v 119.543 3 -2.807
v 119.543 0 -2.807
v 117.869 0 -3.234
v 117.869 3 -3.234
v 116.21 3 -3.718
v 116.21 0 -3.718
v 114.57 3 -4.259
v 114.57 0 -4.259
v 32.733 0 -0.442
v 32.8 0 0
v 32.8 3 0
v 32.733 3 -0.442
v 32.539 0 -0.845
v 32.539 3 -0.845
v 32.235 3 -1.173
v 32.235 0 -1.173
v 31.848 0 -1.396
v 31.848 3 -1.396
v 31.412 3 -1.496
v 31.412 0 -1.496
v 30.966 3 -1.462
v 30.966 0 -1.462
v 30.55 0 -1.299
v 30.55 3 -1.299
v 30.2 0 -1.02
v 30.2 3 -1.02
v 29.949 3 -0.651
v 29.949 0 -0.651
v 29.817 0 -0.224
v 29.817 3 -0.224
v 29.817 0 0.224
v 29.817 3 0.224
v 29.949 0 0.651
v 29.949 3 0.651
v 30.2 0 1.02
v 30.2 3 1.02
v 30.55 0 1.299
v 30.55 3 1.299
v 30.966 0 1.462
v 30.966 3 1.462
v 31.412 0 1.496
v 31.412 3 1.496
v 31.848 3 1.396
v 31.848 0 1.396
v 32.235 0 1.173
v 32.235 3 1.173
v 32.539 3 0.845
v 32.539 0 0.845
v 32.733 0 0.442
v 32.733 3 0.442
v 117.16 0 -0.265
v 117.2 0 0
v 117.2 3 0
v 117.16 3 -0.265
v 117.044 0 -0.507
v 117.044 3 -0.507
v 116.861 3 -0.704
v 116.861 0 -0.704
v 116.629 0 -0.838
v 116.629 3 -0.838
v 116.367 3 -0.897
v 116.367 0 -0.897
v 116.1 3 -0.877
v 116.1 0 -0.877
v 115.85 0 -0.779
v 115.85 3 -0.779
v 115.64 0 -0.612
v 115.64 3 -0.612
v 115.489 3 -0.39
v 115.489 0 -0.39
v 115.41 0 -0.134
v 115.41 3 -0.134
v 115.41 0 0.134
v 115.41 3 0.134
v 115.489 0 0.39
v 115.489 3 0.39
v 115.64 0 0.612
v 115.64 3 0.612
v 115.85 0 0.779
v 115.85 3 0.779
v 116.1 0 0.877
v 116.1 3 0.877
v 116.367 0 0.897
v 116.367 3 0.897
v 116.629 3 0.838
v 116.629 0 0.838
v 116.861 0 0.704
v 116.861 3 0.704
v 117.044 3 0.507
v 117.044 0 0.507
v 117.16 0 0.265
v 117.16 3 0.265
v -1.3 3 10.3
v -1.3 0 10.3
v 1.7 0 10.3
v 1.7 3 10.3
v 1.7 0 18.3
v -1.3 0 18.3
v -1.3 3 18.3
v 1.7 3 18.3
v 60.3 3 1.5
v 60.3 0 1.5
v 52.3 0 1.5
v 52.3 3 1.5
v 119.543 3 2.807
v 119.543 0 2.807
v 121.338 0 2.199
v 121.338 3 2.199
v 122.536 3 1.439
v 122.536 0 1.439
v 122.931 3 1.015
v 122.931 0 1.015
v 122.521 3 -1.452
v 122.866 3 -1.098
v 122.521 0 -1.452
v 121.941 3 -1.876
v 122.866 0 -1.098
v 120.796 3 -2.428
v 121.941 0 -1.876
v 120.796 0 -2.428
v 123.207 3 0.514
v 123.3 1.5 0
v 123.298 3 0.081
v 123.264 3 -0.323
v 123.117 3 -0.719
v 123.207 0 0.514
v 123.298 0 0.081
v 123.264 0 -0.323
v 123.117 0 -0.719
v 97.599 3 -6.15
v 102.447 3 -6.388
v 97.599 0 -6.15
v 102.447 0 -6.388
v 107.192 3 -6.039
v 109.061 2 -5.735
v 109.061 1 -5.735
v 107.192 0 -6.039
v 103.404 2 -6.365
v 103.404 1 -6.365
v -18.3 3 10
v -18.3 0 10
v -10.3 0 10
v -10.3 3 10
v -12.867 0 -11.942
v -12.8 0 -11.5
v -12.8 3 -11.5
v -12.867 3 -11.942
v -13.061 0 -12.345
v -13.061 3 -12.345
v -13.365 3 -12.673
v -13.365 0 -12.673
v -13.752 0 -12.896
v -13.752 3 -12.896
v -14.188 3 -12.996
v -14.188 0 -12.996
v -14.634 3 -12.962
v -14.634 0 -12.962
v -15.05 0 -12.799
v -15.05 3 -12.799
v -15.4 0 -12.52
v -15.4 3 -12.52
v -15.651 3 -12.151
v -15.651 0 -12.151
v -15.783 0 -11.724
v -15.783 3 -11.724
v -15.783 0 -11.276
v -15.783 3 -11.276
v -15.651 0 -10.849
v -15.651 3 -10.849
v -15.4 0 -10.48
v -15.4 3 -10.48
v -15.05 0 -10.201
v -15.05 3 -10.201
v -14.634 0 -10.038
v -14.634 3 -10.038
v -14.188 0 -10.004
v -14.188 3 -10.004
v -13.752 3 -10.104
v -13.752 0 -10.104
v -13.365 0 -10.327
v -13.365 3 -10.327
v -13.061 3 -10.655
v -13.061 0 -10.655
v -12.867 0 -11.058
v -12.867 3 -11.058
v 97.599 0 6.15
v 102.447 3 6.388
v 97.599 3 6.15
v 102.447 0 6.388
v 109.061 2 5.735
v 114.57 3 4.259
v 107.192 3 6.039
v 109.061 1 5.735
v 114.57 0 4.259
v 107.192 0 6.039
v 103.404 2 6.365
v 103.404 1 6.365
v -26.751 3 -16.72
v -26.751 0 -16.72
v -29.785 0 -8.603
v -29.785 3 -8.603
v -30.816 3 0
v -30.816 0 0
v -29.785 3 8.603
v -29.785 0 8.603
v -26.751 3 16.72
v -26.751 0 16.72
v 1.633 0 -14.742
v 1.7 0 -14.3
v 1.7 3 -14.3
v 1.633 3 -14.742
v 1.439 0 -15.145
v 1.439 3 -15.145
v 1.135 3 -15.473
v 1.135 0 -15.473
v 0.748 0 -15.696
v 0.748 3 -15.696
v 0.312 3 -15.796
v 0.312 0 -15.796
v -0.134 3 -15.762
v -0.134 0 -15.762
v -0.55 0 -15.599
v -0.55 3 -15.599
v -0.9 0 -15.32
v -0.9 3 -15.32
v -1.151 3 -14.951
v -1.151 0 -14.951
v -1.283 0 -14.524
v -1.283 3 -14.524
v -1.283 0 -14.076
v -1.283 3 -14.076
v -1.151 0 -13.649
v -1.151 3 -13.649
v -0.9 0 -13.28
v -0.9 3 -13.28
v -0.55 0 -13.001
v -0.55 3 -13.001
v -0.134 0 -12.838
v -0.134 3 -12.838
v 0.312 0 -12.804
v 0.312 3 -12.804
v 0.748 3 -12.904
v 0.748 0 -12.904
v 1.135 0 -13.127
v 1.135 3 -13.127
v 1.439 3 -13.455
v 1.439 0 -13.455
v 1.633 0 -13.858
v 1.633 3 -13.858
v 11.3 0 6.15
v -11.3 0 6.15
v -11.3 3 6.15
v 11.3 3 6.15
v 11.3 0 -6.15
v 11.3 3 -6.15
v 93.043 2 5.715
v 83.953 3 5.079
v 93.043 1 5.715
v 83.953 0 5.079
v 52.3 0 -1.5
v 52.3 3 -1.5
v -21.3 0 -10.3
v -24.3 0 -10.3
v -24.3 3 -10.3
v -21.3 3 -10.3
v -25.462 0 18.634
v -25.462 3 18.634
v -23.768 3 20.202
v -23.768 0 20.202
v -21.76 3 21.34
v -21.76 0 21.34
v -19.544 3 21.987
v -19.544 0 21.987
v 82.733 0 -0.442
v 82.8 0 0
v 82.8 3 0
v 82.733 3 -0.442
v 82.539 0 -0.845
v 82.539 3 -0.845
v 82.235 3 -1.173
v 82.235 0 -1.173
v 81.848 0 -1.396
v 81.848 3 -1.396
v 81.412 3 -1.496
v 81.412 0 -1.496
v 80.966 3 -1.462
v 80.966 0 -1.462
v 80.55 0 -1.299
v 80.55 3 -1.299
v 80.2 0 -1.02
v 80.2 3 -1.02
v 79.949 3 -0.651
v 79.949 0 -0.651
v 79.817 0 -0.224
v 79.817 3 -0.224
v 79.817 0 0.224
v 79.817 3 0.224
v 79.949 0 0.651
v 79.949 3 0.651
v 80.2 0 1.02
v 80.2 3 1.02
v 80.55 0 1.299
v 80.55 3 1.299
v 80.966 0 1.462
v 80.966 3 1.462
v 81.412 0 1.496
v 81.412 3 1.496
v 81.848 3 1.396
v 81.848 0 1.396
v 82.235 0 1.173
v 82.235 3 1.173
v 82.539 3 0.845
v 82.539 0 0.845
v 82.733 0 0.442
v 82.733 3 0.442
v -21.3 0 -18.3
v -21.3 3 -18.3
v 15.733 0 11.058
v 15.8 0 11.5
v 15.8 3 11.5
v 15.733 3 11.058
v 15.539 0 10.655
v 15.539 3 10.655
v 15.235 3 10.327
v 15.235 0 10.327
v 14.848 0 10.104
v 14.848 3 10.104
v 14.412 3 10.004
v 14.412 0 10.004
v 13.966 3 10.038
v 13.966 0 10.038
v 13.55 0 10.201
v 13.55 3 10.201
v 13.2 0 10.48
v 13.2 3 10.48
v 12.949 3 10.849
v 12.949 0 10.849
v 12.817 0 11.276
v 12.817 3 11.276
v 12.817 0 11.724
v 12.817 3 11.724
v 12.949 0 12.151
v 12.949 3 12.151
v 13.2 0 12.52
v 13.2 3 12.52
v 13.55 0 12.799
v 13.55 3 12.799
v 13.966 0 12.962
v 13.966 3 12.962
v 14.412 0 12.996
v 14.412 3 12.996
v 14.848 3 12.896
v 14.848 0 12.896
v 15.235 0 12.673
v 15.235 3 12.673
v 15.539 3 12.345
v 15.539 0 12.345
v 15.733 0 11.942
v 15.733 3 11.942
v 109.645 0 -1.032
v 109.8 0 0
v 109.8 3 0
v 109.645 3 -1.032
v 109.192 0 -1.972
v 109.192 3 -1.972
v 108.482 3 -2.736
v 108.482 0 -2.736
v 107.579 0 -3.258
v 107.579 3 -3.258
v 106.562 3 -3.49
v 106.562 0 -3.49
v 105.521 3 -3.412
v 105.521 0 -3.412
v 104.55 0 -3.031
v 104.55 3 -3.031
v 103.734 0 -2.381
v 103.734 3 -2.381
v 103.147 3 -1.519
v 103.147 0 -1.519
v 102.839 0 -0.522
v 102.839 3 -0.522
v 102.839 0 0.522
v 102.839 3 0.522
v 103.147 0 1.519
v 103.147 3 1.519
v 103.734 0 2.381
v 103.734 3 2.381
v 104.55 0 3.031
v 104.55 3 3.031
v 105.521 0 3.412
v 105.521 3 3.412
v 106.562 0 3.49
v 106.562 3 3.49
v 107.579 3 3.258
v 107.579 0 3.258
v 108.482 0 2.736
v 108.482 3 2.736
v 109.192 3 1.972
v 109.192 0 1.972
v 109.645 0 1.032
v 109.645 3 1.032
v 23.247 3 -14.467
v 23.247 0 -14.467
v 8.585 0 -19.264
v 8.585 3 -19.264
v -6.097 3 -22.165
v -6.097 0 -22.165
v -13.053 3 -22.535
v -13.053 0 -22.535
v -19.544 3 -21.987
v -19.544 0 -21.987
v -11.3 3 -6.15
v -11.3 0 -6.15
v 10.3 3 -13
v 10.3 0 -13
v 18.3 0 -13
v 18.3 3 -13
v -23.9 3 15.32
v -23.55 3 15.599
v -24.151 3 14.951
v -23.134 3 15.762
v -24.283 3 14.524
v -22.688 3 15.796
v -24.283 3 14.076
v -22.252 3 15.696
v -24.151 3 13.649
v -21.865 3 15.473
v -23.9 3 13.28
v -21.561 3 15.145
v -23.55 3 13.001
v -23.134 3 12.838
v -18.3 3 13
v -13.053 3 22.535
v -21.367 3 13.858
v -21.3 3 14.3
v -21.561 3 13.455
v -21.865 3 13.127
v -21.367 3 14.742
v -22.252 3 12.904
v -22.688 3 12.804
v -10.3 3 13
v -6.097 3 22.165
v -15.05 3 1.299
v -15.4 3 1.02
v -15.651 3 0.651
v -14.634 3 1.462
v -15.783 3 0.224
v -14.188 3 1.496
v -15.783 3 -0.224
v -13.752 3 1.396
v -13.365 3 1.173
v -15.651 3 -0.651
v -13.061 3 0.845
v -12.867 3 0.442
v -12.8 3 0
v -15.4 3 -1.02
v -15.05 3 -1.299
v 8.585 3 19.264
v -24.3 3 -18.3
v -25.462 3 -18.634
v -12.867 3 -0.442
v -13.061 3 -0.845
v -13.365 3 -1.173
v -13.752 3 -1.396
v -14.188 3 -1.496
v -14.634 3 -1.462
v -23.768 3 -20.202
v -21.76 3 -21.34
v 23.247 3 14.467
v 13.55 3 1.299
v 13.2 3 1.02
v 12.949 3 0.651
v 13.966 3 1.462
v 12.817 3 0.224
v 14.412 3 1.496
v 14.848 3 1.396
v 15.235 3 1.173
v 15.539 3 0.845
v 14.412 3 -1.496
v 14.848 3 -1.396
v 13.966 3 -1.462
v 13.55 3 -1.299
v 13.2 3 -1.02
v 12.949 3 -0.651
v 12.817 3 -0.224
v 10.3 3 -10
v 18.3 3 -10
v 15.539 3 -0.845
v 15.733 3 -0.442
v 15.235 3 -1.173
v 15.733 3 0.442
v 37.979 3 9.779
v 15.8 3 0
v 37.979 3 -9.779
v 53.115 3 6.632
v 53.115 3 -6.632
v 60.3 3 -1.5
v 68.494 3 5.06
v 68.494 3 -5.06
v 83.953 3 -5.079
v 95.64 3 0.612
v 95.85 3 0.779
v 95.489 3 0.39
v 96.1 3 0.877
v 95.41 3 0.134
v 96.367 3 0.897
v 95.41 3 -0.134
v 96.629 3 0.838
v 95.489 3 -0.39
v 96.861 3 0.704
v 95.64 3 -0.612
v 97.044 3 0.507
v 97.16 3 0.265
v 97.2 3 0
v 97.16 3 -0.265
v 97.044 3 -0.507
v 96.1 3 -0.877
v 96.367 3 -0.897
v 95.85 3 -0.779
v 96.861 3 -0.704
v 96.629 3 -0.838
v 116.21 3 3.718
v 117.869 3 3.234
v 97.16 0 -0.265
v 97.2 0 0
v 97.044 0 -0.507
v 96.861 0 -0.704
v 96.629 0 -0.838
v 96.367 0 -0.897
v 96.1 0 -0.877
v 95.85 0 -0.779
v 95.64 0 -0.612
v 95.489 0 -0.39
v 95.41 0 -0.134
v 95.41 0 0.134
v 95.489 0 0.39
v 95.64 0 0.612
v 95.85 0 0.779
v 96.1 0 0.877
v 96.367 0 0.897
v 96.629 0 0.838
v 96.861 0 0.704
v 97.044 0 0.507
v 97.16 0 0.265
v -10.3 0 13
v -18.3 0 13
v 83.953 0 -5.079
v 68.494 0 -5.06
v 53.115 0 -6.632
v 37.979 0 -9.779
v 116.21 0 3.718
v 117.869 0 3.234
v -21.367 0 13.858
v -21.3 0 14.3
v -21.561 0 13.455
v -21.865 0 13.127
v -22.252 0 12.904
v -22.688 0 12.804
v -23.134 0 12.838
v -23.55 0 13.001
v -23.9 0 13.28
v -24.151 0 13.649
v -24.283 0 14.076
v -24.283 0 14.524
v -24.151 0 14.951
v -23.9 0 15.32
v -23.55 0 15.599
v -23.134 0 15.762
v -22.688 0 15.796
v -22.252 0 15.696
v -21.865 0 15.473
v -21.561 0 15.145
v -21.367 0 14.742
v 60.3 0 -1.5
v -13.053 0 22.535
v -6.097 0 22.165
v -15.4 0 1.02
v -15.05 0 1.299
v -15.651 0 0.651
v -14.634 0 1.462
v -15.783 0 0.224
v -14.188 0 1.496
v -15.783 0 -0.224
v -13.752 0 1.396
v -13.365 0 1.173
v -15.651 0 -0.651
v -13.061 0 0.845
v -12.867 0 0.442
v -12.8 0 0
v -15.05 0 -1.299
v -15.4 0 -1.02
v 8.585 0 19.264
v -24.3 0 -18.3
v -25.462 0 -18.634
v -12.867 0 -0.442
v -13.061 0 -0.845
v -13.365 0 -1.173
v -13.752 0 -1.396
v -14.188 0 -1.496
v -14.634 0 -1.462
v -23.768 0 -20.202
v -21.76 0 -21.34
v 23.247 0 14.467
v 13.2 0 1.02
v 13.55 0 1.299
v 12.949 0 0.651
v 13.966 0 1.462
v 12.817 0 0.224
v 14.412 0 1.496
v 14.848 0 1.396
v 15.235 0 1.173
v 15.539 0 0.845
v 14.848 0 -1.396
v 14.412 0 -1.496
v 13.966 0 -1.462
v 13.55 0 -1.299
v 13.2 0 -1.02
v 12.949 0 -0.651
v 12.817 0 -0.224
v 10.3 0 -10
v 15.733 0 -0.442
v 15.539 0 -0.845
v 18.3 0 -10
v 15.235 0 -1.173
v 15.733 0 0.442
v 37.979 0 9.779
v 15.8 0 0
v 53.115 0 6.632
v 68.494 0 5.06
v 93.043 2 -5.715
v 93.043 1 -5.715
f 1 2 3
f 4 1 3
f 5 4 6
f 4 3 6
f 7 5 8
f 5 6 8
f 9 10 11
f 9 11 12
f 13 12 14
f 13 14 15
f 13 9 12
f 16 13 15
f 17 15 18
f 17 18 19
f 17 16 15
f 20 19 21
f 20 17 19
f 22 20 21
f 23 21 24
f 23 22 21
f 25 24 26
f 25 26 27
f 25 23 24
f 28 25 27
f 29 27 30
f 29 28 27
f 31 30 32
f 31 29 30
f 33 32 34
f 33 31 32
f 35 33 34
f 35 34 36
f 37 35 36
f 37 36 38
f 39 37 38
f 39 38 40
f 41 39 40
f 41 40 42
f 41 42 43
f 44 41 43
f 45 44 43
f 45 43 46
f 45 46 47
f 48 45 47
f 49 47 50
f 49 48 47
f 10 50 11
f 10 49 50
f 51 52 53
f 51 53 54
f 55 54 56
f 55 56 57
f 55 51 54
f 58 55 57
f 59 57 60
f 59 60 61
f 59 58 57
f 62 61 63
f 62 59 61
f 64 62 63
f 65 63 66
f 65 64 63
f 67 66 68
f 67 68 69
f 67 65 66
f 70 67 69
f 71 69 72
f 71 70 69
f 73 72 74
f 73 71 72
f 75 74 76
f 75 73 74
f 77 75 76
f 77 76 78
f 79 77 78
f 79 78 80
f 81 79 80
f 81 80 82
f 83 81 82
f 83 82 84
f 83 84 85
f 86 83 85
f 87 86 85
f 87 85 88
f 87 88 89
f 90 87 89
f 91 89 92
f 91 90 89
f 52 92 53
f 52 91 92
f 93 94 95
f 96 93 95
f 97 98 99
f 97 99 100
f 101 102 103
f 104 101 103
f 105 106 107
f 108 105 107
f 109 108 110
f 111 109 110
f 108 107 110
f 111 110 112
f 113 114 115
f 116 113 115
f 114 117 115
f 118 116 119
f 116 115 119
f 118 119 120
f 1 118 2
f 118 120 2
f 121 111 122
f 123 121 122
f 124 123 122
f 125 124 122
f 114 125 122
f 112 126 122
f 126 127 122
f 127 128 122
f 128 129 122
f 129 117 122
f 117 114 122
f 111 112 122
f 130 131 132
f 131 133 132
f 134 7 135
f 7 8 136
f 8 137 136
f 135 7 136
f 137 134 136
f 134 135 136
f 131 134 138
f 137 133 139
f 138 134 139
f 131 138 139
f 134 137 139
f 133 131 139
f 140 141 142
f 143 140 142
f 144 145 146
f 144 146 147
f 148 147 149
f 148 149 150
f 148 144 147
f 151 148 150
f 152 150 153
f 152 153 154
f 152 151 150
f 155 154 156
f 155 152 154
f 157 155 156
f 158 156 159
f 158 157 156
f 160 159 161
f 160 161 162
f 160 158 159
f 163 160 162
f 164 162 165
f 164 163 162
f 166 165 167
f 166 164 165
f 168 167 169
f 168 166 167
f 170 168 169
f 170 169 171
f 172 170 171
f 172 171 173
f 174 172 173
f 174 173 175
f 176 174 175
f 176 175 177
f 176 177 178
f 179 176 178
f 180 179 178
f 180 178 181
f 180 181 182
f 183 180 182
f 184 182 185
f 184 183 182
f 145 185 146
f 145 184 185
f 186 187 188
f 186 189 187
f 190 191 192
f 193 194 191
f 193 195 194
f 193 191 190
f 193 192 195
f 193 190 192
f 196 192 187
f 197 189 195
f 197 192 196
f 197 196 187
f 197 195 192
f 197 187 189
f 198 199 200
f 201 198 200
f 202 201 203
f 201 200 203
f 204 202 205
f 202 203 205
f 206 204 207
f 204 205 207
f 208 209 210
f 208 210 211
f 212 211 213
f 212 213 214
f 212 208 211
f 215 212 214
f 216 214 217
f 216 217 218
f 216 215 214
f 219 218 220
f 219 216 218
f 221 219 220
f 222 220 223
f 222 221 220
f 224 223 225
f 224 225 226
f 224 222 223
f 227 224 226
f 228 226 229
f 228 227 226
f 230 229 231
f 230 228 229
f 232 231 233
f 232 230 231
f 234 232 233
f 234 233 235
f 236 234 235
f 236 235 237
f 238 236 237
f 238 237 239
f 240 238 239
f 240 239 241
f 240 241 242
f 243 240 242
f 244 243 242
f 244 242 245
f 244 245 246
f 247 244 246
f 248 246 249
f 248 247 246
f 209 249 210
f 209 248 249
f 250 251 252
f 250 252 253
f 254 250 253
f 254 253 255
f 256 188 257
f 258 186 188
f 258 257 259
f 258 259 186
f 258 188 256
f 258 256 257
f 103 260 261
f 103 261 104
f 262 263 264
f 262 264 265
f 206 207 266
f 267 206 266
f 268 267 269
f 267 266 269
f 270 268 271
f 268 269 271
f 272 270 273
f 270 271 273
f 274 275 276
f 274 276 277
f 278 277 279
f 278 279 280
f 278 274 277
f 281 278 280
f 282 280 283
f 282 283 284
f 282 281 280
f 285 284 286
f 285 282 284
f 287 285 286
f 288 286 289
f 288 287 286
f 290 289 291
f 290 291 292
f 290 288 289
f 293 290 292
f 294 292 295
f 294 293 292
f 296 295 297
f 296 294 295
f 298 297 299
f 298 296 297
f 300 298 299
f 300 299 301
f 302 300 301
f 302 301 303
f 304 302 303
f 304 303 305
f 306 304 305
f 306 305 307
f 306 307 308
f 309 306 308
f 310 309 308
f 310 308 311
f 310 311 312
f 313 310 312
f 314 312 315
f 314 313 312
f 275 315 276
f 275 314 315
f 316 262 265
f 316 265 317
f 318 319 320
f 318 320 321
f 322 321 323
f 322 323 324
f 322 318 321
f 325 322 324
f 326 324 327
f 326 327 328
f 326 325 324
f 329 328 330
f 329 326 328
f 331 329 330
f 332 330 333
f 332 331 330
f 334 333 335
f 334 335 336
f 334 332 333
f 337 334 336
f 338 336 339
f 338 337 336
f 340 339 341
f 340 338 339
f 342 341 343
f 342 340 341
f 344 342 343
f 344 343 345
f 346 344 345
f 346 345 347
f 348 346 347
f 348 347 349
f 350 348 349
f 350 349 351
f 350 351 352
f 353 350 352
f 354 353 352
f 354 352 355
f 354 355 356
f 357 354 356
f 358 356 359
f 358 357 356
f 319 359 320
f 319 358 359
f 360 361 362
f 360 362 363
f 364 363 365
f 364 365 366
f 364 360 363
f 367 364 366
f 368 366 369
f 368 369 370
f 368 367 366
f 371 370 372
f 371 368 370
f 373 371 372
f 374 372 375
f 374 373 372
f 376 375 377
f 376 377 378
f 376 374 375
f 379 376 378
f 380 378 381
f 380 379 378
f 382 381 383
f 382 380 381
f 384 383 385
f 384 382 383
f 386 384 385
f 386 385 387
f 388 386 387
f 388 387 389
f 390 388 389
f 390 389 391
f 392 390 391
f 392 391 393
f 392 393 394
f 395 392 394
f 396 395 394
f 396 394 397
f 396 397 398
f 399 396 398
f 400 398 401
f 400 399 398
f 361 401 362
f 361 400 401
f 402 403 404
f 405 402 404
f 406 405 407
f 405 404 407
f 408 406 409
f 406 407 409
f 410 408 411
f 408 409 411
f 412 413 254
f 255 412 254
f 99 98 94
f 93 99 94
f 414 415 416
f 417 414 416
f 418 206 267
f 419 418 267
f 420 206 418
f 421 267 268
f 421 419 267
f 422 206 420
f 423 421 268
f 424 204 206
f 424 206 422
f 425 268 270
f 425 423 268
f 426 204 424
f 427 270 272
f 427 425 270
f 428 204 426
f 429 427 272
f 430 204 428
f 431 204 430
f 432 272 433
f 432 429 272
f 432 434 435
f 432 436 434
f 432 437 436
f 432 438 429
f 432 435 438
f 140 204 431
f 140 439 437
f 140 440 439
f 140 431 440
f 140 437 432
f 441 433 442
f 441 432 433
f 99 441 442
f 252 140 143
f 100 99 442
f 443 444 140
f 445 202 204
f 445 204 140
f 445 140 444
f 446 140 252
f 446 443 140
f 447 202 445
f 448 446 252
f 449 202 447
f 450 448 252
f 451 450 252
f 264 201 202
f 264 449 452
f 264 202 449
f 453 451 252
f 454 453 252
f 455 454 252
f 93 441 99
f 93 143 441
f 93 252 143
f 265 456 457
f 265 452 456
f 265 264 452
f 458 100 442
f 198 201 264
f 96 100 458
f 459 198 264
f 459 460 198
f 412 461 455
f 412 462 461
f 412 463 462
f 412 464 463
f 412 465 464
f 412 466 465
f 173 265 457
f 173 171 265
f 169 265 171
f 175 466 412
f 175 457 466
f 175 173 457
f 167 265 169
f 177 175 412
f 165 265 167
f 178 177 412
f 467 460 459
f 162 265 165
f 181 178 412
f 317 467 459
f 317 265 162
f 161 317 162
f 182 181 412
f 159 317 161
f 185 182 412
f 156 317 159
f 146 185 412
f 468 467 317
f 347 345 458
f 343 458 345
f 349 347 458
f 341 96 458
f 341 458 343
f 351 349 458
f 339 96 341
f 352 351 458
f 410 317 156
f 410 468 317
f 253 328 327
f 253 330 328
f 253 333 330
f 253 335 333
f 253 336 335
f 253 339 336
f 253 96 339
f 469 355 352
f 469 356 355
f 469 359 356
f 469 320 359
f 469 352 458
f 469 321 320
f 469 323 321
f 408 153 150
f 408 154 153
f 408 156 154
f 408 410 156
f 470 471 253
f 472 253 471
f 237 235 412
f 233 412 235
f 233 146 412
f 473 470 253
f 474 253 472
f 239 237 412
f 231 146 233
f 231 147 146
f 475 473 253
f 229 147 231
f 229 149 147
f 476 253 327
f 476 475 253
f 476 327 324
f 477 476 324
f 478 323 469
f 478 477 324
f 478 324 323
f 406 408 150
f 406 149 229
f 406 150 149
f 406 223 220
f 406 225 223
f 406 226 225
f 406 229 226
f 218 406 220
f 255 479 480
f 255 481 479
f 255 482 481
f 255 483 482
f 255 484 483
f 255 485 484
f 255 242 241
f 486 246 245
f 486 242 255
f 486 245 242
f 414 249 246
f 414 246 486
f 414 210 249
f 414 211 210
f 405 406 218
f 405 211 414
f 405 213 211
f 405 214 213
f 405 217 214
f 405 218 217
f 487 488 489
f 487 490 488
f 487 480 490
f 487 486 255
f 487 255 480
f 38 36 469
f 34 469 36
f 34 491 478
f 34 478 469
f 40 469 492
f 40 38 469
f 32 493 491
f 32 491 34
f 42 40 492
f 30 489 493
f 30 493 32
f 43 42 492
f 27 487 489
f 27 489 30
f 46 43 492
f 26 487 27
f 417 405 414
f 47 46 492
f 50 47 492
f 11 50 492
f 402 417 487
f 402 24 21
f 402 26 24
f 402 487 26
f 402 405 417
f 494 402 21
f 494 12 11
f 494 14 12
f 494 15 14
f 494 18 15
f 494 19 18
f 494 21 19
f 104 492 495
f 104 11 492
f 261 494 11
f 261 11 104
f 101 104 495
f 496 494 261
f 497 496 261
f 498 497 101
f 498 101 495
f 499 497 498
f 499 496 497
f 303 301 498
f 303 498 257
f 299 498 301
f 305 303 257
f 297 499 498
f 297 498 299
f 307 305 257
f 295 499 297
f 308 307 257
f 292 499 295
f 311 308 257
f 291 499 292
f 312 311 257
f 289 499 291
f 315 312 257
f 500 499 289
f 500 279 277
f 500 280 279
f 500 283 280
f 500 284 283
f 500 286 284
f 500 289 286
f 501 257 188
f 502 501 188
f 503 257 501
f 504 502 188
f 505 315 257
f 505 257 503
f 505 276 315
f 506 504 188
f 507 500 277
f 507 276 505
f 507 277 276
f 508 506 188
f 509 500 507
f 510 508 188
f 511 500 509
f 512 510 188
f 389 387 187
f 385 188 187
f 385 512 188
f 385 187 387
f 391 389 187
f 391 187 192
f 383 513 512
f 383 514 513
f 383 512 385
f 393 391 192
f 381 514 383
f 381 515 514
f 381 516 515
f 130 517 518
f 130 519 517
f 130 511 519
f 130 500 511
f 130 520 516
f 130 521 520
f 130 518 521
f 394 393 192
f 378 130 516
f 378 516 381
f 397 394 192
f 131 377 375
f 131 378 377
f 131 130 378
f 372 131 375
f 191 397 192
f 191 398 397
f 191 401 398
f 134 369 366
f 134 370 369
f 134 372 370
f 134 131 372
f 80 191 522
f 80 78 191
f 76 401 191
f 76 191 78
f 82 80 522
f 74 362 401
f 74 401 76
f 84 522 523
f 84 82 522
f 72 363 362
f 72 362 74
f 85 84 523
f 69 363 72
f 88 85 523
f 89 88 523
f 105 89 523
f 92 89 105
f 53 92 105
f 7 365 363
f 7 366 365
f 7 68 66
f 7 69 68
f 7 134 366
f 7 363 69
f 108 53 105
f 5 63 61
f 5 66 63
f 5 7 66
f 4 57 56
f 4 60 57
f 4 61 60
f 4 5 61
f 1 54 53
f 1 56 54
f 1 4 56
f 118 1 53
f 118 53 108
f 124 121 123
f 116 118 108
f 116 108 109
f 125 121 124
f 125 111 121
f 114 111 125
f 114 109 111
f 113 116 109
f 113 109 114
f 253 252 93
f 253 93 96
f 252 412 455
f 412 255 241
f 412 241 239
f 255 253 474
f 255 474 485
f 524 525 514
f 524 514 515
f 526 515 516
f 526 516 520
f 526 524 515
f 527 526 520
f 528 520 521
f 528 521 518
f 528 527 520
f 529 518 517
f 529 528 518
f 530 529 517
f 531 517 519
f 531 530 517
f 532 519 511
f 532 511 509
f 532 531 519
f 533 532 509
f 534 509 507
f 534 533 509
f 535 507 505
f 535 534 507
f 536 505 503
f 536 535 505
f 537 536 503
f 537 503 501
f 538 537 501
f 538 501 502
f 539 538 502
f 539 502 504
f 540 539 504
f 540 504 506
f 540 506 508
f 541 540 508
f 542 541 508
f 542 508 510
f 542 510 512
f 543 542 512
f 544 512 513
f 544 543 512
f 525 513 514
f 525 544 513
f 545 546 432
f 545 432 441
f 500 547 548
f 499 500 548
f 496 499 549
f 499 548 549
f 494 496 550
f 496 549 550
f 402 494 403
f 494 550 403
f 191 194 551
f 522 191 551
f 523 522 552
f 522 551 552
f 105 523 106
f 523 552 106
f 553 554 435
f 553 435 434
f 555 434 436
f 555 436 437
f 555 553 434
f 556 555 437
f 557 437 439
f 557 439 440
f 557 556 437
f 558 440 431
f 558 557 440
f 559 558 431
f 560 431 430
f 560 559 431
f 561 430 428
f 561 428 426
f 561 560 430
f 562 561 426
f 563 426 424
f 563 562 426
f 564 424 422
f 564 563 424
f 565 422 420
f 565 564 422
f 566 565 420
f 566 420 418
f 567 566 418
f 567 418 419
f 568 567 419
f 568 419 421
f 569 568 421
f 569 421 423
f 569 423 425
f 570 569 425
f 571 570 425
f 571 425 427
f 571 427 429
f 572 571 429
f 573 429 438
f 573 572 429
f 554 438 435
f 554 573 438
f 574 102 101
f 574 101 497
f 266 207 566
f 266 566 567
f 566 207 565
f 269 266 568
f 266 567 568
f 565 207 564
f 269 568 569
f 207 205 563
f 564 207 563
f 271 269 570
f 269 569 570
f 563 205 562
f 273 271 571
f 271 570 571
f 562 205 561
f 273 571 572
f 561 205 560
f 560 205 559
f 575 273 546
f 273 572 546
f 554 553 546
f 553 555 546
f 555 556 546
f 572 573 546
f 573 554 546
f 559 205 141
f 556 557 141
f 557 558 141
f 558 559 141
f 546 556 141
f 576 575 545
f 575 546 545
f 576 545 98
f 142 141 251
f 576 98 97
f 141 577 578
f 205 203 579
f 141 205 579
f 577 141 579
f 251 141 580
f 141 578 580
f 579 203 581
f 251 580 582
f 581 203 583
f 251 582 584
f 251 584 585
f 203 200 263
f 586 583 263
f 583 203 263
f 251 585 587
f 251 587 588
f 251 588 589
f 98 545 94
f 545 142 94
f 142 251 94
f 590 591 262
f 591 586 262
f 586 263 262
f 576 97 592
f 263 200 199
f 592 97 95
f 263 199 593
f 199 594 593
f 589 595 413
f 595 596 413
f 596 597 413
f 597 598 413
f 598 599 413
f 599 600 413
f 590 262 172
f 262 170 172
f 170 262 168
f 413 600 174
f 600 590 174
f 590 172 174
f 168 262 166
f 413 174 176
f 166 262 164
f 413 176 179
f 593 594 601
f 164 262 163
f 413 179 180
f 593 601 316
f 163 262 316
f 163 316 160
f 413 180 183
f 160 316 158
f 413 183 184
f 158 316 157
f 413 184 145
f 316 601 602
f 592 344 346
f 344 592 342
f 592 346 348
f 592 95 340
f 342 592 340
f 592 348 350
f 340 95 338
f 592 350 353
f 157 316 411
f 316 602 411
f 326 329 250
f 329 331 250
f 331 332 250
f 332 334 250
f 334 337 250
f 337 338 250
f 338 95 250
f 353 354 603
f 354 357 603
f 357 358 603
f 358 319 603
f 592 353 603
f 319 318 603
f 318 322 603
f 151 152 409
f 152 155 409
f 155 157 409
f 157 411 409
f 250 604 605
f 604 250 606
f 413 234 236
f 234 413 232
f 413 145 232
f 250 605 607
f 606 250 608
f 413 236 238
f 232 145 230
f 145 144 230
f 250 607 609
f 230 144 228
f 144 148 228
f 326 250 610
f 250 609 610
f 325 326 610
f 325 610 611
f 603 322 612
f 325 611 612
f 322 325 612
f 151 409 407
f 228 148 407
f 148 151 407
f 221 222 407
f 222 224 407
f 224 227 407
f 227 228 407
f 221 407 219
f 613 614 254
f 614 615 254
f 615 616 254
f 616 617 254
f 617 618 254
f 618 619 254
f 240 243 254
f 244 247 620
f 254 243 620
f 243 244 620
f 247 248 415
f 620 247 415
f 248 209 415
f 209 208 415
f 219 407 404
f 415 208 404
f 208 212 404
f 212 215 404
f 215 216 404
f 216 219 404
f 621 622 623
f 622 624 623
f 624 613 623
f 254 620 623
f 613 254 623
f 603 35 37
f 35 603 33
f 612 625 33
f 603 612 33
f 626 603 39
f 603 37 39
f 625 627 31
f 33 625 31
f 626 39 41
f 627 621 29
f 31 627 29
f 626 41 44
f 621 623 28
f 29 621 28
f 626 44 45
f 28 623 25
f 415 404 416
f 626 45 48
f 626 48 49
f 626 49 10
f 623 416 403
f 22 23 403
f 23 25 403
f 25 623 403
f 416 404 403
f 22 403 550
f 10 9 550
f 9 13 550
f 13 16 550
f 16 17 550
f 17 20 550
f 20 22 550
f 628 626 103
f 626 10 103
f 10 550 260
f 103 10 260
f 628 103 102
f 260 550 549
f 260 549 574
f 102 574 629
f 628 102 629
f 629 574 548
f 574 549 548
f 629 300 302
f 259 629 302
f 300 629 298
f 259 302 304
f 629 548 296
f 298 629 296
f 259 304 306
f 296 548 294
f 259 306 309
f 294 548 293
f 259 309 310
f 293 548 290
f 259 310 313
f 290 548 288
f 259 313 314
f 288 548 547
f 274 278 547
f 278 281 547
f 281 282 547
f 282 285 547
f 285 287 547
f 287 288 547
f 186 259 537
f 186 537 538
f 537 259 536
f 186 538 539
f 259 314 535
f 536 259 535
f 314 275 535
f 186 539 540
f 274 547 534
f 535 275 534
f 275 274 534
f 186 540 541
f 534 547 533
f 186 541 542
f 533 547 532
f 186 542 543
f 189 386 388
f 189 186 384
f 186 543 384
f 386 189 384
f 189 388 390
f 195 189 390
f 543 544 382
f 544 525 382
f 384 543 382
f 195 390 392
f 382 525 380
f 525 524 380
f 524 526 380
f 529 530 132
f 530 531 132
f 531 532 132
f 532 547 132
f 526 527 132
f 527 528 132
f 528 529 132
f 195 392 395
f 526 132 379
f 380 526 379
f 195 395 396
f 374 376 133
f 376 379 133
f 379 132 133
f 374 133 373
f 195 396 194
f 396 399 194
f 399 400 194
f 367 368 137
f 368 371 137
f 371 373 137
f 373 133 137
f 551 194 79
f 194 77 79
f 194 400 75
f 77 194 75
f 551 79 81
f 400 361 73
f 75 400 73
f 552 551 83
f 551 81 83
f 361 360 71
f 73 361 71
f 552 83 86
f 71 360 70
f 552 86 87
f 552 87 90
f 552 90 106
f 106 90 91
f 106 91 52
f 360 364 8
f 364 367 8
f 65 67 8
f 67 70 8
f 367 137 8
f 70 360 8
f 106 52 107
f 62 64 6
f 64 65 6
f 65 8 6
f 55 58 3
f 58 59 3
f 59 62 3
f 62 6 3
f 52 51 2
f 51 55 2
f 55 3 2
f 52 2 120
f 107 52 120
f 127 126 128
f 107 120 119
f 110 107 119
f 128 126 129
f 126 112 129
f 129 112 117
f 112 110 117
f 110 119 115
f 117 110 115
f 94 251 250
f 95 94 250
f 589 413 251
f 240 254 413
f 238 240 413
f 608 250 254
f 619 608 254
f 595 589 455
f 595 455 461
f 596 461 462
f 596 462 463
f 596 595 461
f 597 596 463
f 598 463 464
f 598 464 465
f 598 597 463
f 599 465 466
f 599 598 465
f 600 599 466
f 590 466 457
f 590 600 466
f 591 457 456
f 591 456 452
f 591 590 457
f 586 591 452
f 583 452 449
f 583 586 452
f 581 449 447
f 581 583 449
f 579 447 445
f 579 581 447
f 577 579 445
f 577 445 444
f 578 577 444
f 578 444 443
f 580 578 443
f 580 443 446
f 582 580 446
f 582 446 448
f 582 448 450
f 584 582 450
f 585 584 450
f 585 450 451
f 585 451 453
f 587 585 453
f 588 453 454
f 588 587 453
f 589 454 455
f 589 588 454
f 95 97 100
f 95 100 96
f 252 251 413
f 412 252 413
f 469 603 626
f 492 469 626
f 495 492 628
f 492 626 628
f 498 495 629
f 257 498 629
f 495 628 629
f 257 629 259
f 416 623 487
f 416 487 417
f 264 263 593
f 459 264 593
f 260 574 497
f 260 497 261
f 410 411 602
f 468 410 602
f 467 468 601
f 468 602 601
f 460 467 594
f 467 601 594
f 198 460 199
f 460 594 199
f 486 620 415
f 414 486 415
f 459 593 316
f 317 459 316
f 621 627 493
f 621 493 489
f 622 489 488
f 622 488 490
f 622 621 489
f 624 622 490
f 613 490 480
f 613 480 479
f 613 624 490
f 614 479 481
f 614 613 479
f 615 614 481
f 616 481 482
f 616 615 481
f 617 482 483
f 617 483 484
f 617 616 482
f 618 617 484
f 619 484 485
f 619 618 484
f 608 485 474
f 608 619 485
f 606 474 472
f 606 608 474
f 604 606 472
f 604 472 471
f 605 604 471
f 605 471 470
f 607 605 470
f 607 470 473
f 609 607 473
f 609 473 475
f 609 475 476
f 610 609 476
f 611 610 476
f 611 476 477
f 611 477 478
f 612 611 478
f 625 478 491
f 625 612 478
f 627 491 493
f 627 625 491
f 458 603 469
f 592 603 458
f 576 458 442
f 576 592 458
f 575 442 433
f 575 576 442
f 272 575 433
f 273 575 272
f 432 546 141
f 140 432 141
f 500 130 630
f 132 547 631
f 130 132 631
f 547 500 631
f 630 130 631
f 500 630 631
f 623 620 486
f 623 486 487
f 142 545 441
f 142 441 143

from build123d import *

# Parameters (mm, degrees)
ESBO_O1_R                = 1.5
ESBO_O1_R_2              = 3.5
ESBO_O1_R_3              = 0.9
ESBO_O1_W                = 22.6
ESBO_O1_H                = 12.3
ESBO_O1_W_2              = 3
ESBO_O1_H_2              = 8
ESBO_O1_W_3              = 8
ESBO_O1_H_3              = 3
RESSALTO_EXTRUS_O1_DEPTH = 3


with BuildPart() as part:
    # Esboço1 → Ressalto-extrusão1 (new body)
    with BuildSketch(Plane(origin=(0, 0, 0), x_dir=(1, 0, 0), z_dir=(0, 1, 0))):
        with BuildLine():
            ThreePointArc((-26.75078073, 16.719697214), (-30.815641586, -2.3e-07), (-26.750780519, -16.719697622))
            ThreePointArc((-26.750780519, -16.719697622), (-23.767751269, -20.202130616), (-19.544028371, -21.987058612))
            add(Edge.make_bspline(
                [(23.247280819, -14.466941833), (22.21541658, -14.85491506), (7.843575487, -20.128766531), (-8.032505645, -23.945383183), (-19.544028371, -21.987058612)],
                knots=[0.1894974, 0.1894974, 0.1894974, 0.1894974, 0.216439611, 0.561126756, 0.561126756, 0.561126756, 0.561126756], degree=3))
            ThreePointArc((23.247280819, -14.466941833), (53.114593998, -6.632399806), (83.953283265, -5.079438247))
            add(Edge.make_bspline(
                [(97.598521861, -6.15), (93.039003458, -5.676054912), (88.490590593, -5.319200994), (83.953283265, -5.079438247)],
                knots=[0, 0, 0, 0, 0.137959586, 0.137959586, 0.137959586, 0.137959586], degree=3))
            add(Edge.make_bspline(
                [(114.569723425, -4.259468977), (109.134912936, -6.157348784), (103.477845748, -6.787525792), (97.598521861, -6.15)],
                knots=[0.35388944, 0.35388944, 0.35388944, 0.35388944, 1, 1, 1, 1], degree=3))
            ThreePointArc((114.569723425, -4.259468977), (117.037611185, -3.468795912), (119.543150354, -2.807050219))
            add(Edge.make_bspline(
                [(119.543150354, -2.807050219), (131.408766059, 0), (119.543150354, 2.807050219)],
                knots=[5.194112445, 5.194112445, 5.194112445, 7.372258169, 7.372258169, 7.372258169], degree=2, weights=[1, 0.463307193, 1]))
            ThreePointArc((119.543150354, 2.807050219), (117.037611185, 3.468795912), (114.569723425, 4.259468977))
            add(Edge.make_bspline(
                [(114.569723425, 4.259468977), (109.134912936, 6.157348784), (103.477845748, 6.787525792), (97.598521861, 6.15)],
                knots=[0.35388944, 0.35388944, 0.35388944, 0.35388944, 1, 1, 1, 1], degree=3))
            add(Edge.make_bspline(
                [(97.598521861, 6.15), (93.039003574, 5.676054924), (88.490590825, 5.319201013), (83.953283612, 5.079438265)],
                knots=[0, 0, 0, 0, 0.137959582, 0.137959582, 0.137959582, 0.137959582], degree=3))
            ThreePointArc((83.953283612, 5.079438265), (53.114594943, 6.632399691), (23.24728229, 14.466941345))
            add(Edge.make_bspline(
                [(23.24728229, 14.466941345), (22.21541757, 14.854914742), (7.843576153, 20.128766099), (-8.032505406, 23.945382333), (-19.544028008, 21.987058404)],
                knots=[0.189497388, 0.189497388, 0.189497388, 0.189497388, 0.216439611, 0.561126752, 0.561126752, 0.561126752, 0.561126752], degree=3))
            ThreePointArc((-19.544028008, 21.987058404), (-23.767751262, 20.202130438), (-26.75078073, 16.719697214))
        make_face()
        with Locations((-14.3, 0)):
            Circle(ESBO_O1_R, mode=Mode.SUBTRACT)
        with Locations((14.3, 0)):
            Circle(ESBO_O1_R, mode=Mode.SUBTRACT)
        with Locations((0.2, 14.3)):
            Circle(ESBO_O1_R, mode=Mode.SUBTRACT)
        with Locations((-22.8, -14.3)):
            Circle(ESBO_O1_R, mode=Mode.SUBTRACT)
        with Locations((-14.3, 11.5)):
            Circle(ESBO_O1_R, mode=Mode.SUBTRACT)
        with Locations((14.3, -11.5)):
            Circle(ESBO_O1_R, mode=Mode.SUBTRACT)
        with Locations((106.3, 0)):
            Circle(ESBO_O1_R_2, mode=Mode.SUBTRACT)
        with Locations((96.3, 0)):
            Circle(ESBO_O1_R_3, mode=Mode.SUBTRACT)
        with Locations((116.3, 0)):
            Circle(ESBO_O1_R_3, mode=Mode.SUBTRACT)
        with Locations((31.3, 0)):
            Circle(ESBO_O1_R, mode=Mode.SUBTRACT)
        with Locations((81.3, 0)):
            Circle(ESBO_O1_R, mode=Mode.SUBTRACT)
        Rectangle(ESBO_O1_W, ESBO_O1_H, mode=Mode.SUBTRACT)
        with Locations((0.2, -14.3)):
            Rectangle(ESBO_O1_W_2, ESBO_O1_H_2, mode=Mode.SUBTRACT)
        with Locations((-22.8, 14.3)):
            Rectangle(ESBO_O1_W_2, ESBO_O1_H_2, mode=Mode.SUBTRACT)
        with Locations((14.3, 11.500000009)):
            Rectangle(ESBO_O1_W_3, ESBO_O1_H_3, mode=Mode.SUBTRACT)
        with Locations((-14.3, -11.5)):
            Rectangle(ESBO_O1_W_3, ESBO_O1_H_3, mode=Mode.SUBTRACT)
        Polygon((56.3, -1.5), (60.3, -1.5), (60.3, 1.5), (52.3, 1.5), (52.3, -1.5), align=None, mode=Mode.SUBTRACT)
    extrude(amount=RESSALTO_EXTRUS_O1_DEPTH)


solid = part.part
